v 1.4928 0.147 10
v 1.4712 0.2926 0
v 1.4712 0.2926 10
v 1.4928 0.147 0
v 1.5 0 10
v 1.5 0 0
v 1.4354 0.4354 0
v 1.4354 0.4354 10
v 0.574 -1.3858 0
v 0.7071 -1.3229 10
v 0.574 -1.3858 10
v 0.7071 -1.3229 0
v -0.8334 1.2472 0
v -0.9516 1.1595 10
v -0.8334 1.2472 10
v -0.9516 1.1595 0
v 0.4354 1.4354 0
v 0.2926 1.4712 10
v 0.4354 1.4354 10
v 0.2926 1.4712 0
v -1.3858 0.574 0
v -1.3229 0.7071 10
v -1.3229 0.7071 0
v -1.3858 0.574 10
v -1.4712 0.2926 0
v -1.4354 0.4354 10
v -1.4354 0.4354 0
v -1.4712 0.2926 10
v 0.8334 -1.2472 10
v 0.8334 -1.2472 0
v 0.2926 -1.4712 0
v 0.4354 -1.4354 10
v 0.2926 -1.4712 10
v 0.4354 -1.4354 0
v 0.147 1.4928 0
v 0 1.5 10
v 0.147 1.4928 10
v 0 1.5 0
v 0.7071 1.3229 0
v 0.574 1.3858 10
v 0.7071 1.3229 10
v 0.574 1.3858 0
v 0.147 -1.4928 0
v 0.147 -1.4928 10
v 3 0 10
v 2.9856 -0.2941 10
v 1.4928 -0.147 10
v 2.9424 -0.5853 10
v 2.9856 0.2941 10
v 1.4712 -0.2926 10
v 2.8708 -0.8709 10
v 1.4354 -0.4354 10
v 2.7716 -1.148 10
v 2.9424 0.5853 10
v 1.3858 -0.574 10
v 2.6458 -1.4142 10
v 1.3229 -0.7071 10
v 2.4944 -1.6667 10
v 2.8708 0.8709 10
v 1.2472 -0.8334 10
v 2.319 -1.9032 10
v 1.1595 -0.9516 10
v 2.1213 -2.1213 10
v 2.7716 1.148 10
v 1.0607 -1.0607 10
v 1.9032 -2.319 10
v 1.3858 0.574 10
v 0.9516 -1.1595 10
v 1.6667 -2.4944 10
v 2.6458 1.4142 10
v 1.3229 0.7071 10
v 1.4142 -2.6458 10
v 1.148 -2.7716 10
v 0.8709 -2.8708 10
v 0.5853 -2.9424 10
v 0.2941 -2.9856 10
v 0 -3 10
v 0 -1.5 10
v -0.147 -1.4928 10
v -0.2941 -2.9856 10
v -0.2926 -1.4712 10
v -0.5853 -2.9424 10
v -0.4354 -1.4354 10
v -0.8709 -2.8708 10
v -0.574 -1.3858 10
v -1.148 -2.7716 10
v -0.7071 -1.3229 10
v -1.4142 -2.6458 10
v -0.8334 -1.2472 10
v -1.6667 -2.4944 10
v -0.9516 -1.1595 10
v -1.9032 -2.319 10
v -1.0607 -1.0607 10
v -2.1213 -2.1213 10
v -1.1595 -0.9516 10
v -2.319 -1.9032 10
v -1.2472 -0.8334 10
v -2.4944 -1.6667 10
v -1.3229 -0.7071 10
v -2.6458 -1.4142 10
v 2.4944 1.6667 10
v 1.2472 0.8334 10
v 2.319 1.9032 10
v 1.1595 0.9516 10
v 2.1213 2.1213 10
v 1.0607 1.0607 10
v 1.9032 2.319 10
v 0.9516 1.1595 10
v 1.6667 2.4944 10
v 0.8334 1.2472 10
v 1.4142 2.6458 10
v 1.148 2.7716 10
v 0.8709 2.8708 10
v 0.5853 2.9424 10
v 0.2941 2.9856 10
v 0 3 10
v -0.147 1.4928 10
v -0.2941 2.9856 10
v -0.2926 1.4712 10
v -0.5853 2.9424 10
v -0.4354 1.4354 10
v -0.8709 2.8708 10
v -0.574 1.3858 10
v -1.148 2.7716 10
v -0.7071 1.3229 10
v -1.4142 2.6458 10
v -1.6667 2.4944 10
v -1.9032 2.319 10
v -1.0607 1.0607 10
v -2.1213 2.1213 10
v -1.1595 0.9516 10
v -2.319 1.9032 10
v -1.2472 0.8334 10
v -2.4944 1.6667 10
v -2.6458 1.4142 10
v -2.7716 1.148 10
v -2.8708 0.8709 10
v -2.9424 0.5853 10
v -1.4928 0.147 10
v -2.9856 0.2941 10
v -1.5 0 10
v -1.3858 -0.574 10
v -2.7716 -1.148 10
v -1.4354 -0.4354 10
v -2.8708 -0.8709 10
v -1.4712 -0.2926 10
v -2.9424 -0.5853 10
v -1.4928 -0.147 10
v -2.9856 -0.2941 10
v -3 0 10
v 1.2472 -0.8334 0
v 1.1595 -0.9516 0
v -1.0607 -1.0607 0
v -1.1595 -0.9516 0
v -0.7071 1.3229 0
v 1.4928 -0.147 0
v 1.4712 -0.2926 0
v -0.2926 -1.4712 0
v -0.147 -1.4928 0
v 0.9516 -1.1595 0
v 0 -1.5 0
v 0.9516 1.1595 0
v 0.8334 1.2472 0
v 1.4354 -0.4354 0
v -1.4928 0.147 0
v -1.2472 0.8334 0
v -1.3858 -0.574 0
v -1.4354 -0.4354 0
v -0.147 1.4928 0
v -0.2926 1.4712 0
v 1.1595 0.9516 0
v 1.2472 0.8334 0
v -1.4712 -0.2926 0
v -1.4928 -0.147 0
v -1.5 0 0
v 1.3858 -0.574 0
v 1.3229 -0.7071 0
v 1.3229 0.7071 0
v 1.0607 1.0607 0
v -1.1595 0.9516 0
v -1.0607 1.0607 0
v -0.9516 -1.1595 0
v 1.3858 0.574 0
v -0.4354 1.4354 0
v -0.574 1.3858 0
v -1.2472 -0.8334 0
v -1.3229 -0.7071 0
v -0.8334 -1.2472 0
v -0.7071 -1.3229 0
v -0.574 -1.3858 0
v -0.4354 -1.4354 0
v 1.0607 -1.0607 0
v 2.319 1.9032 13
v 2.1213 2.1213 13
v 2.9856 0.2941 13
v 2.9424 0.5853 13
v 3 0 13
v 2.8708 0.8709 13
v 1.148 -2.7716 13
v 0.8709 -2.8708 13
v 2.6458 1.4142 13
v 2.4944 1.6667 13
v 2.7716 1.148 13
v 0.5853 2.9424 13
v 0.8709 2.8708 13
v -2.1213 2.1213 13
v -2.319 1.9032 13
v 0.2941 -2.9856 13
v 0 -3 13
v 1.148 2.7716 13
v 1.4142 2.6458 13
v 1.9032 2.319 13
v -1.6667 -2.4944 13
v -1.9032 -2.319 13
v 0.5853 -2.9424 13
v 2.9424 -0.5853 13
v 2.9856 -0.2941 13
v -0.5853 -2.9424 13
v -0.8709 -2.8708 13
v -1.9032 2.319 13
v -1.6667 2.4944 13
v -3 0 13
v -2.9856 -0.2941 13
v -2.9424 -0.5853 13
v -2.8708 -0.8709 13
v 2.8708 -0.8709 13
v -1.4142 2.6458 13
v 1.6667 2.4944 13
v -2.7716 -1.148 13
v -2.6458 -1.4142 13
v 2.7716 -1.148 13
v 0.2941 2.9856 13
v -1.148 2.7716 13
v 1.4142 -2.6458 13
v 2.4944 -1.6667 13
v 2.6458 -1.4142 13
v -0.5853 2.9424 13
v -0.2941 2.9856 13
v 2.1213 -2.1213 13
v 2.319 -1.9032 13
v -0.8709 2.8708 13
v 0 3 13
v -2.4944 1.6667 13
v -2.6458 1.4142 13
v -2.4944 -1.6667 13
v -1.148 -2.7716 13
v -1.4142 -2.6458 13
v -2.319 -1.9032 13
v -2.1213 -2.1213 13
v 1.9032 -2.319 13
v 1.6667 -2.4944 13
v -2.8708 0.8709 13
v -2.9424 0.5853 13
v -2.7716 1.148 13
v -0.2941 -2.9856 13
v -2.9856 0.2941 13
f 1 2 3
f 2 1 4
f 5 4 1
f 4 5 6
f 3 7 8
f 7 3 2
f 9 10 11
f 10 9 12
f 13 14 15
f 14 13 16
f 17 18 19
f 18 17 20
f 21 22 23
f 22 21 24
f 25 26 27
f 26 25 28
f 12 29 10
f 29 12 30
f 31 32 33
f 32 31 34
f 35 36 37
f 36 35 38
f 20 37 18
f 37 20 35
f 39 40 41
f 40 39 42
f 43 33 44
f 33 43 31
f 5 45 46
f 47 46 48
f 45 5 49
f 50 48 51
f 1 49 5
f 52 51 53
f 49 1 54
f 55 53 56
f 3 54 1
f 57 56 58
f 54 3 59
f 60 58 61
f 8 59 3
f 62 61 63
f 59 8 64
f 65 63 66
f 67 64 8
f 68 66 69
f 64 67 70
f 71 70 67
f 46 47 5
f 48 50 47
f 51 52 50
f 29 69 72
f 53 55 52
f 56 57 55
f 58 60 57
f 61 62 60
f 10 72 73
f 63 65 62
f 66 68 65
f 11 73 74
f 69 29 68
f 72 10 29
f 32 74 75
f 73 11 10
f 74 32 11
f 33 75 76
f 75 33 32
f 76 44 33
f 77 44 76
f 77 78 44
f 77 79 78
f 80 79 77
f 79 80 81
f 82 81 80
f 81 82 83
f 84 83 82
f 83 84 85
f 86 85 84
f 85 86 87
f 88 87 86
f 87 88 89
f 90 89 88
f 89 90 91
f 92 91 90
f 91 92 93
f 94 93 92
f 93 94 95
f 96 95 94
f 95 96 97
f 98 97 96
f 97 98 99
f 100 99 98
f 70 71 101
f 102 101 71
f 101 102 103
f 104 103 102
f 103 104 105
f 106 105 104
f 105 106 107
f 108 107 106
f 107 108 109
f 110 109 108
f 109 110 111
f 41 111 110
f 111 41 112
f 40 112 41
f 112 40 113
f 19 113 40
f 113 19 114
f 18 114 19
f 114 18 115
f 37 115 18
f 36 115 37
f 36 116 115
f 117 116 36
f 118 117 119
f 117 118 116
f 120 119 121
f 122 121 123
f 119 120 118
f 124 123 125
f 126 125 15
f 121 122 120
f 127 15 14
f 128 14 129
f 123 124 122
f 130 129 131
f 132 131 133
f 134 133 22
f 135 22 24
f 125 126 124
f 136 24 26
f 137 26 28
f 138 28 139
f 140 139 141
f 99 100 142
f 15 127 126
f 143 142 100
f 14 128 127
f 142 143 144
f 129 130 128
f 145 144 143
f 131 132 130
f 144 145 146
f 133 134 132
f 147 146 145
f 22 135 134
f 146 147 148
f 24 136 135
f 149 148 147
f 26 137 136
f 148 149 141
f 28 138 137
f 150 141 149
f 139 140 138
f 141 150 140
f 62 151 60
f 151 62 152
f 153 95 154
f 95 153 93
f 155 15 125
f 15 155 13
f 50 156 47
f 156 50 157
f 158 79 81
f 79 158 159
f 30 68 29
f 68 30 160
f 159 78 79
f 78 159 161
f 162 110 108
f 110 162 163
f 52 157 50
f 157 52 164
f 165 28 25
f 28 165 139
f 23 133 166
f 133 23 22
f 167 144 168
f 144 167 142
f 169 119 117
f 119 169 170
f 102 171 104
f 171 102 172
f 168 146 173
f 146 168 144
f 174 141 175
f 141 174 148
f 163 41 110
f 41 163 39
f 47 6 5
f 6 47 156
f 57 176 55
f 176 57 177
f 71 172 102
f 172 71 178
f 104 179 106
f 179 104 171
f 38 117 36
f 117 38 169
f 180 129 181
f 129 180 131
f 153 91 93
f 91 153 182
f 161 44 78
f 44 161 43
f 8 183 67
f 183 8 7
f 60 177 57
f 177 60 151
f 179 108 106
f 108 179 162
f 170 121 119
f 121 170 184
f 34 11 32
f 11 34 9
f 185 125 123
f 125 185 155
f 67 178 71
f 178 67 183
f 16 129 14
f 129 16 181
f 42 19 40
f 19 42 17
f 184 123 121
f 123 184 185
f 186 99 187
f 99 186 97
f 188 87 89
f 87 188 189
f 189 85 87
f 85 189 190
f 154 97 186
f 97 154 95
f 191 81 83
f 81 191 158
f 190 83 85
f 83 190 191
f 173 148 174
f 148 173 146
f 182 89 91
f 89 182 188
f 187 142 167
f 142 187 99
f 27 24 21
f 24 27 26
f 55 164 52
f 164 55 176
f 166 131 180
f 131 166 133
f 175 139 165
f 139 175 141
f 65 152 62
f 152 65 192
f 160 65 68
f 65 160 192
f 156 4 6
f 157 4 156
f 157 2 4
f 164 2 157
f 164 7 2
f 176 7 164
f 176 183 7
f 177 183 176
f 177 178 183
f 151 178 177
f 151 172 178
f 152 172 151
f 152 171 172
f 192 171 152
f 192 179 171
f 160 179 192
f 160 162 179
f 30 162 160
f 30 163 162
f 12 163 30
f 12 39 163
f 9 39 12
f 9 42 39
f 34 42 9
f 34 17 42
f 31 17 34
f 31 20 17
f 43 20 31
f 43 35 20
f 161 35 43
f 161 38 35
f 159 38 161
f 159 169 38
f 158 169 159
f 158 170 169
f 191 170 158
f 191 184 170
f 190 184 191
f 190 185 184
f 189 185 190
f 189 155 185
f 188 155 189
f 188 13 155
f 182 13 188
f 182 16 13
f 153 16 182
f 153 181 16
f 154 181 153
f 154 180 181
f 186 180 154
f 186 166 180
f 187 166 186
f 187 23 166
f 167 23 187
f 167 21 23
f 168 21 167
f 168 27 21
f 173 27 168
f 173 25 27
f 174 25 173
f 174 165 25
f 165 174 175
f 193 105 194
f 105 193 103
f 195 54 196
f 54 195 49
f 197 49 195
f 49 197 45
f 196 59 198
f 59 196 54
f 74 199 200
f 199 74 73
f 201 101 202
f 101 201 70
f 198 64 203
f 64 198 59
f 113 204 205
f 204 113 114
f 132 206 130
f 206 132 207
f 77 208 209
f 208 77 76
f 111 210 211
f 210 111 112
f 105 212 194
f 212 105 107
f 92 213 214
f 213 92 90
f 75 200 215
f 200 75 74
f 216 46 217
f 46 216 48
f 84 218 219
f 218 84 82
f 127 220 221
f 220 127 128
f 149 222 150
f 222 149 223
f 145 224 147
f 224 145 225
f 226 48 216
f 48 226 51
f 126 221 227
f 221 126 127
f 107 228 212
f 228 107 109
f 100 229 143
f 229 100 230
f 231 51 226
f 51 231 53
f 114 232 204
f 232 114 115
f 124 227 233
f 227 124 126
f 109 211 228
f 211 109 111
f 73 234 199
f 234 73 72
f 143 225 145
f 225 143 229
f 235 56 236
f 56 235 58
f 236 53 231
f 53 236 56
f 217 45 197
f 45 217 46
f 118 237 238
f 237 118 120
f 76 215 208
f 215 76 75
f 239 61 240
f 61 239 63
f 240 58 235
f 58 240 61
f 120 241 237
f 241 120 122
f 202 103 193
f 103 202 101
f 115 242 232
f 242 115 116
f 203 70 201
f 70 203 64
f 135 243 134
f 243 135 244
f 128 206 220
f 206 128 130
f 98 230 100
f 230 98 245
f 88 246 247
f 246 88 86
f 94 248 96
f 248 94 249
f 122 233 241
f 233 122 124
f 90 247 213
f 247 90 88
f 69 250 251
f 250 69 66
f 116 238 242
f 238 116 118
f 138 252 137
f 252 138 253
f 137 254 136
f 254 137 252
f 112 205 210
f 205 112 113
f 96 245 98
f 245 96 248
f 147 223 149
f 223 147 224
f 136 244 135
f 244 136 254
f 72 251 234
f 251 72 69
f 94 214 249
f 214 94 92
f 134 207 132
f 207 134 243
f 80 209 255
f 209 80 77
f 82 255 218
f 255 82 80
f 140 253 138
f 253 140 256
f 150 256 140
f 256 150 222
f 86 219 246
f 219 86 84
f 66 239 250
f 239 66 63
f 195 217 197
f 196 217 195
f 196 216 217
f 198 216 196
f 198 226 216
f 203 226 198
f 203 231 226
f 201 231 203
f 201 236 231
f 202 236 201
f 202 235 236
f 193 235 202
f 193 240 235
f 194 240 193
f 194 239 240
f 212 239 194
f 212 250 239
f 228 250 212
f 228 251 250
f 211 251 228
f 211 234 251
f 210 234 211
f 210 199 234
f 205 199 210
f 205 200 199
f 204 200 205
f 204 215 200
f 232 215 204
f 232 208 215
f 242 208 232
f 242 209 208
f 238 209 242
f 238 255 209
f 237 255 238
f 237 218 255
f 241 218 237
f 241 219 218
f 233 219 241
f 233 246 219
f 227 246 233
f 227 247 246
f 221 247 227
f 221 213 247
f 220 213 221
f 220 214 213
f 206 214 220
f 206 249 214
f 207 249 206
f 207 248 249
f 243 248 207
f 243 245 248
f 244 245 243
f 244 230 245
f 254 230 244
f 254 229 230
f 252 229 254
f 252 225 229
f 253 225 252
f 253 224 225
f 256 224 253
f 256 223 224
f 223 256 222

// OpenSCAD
module socket_head_cap_screw() {
    // Screw dimensions
    screw_diameter = 3.0;
    screw_length = 10.0;
    head_diameter = 6.0;
    head_height = 3.0;
    hex_socket_diameter = 2.0;
    hex_socket_depth = 1.5;

    // Screw body
    cylinder(d=screw_diameter, h=screw_length, $fn=64);

    // Head
    translate([0, 0, screw_length])
        cylinder(d=head_diameter, h=head_height, $fn=64);

    // Hex socket
    translate([0, 0, screw_length + head_height - hex_socket_depth])
        cylinder(d=hex_socket_diameter, h=hex_socket_depth, $fn=6);
}

socket_head_cap_screw();
